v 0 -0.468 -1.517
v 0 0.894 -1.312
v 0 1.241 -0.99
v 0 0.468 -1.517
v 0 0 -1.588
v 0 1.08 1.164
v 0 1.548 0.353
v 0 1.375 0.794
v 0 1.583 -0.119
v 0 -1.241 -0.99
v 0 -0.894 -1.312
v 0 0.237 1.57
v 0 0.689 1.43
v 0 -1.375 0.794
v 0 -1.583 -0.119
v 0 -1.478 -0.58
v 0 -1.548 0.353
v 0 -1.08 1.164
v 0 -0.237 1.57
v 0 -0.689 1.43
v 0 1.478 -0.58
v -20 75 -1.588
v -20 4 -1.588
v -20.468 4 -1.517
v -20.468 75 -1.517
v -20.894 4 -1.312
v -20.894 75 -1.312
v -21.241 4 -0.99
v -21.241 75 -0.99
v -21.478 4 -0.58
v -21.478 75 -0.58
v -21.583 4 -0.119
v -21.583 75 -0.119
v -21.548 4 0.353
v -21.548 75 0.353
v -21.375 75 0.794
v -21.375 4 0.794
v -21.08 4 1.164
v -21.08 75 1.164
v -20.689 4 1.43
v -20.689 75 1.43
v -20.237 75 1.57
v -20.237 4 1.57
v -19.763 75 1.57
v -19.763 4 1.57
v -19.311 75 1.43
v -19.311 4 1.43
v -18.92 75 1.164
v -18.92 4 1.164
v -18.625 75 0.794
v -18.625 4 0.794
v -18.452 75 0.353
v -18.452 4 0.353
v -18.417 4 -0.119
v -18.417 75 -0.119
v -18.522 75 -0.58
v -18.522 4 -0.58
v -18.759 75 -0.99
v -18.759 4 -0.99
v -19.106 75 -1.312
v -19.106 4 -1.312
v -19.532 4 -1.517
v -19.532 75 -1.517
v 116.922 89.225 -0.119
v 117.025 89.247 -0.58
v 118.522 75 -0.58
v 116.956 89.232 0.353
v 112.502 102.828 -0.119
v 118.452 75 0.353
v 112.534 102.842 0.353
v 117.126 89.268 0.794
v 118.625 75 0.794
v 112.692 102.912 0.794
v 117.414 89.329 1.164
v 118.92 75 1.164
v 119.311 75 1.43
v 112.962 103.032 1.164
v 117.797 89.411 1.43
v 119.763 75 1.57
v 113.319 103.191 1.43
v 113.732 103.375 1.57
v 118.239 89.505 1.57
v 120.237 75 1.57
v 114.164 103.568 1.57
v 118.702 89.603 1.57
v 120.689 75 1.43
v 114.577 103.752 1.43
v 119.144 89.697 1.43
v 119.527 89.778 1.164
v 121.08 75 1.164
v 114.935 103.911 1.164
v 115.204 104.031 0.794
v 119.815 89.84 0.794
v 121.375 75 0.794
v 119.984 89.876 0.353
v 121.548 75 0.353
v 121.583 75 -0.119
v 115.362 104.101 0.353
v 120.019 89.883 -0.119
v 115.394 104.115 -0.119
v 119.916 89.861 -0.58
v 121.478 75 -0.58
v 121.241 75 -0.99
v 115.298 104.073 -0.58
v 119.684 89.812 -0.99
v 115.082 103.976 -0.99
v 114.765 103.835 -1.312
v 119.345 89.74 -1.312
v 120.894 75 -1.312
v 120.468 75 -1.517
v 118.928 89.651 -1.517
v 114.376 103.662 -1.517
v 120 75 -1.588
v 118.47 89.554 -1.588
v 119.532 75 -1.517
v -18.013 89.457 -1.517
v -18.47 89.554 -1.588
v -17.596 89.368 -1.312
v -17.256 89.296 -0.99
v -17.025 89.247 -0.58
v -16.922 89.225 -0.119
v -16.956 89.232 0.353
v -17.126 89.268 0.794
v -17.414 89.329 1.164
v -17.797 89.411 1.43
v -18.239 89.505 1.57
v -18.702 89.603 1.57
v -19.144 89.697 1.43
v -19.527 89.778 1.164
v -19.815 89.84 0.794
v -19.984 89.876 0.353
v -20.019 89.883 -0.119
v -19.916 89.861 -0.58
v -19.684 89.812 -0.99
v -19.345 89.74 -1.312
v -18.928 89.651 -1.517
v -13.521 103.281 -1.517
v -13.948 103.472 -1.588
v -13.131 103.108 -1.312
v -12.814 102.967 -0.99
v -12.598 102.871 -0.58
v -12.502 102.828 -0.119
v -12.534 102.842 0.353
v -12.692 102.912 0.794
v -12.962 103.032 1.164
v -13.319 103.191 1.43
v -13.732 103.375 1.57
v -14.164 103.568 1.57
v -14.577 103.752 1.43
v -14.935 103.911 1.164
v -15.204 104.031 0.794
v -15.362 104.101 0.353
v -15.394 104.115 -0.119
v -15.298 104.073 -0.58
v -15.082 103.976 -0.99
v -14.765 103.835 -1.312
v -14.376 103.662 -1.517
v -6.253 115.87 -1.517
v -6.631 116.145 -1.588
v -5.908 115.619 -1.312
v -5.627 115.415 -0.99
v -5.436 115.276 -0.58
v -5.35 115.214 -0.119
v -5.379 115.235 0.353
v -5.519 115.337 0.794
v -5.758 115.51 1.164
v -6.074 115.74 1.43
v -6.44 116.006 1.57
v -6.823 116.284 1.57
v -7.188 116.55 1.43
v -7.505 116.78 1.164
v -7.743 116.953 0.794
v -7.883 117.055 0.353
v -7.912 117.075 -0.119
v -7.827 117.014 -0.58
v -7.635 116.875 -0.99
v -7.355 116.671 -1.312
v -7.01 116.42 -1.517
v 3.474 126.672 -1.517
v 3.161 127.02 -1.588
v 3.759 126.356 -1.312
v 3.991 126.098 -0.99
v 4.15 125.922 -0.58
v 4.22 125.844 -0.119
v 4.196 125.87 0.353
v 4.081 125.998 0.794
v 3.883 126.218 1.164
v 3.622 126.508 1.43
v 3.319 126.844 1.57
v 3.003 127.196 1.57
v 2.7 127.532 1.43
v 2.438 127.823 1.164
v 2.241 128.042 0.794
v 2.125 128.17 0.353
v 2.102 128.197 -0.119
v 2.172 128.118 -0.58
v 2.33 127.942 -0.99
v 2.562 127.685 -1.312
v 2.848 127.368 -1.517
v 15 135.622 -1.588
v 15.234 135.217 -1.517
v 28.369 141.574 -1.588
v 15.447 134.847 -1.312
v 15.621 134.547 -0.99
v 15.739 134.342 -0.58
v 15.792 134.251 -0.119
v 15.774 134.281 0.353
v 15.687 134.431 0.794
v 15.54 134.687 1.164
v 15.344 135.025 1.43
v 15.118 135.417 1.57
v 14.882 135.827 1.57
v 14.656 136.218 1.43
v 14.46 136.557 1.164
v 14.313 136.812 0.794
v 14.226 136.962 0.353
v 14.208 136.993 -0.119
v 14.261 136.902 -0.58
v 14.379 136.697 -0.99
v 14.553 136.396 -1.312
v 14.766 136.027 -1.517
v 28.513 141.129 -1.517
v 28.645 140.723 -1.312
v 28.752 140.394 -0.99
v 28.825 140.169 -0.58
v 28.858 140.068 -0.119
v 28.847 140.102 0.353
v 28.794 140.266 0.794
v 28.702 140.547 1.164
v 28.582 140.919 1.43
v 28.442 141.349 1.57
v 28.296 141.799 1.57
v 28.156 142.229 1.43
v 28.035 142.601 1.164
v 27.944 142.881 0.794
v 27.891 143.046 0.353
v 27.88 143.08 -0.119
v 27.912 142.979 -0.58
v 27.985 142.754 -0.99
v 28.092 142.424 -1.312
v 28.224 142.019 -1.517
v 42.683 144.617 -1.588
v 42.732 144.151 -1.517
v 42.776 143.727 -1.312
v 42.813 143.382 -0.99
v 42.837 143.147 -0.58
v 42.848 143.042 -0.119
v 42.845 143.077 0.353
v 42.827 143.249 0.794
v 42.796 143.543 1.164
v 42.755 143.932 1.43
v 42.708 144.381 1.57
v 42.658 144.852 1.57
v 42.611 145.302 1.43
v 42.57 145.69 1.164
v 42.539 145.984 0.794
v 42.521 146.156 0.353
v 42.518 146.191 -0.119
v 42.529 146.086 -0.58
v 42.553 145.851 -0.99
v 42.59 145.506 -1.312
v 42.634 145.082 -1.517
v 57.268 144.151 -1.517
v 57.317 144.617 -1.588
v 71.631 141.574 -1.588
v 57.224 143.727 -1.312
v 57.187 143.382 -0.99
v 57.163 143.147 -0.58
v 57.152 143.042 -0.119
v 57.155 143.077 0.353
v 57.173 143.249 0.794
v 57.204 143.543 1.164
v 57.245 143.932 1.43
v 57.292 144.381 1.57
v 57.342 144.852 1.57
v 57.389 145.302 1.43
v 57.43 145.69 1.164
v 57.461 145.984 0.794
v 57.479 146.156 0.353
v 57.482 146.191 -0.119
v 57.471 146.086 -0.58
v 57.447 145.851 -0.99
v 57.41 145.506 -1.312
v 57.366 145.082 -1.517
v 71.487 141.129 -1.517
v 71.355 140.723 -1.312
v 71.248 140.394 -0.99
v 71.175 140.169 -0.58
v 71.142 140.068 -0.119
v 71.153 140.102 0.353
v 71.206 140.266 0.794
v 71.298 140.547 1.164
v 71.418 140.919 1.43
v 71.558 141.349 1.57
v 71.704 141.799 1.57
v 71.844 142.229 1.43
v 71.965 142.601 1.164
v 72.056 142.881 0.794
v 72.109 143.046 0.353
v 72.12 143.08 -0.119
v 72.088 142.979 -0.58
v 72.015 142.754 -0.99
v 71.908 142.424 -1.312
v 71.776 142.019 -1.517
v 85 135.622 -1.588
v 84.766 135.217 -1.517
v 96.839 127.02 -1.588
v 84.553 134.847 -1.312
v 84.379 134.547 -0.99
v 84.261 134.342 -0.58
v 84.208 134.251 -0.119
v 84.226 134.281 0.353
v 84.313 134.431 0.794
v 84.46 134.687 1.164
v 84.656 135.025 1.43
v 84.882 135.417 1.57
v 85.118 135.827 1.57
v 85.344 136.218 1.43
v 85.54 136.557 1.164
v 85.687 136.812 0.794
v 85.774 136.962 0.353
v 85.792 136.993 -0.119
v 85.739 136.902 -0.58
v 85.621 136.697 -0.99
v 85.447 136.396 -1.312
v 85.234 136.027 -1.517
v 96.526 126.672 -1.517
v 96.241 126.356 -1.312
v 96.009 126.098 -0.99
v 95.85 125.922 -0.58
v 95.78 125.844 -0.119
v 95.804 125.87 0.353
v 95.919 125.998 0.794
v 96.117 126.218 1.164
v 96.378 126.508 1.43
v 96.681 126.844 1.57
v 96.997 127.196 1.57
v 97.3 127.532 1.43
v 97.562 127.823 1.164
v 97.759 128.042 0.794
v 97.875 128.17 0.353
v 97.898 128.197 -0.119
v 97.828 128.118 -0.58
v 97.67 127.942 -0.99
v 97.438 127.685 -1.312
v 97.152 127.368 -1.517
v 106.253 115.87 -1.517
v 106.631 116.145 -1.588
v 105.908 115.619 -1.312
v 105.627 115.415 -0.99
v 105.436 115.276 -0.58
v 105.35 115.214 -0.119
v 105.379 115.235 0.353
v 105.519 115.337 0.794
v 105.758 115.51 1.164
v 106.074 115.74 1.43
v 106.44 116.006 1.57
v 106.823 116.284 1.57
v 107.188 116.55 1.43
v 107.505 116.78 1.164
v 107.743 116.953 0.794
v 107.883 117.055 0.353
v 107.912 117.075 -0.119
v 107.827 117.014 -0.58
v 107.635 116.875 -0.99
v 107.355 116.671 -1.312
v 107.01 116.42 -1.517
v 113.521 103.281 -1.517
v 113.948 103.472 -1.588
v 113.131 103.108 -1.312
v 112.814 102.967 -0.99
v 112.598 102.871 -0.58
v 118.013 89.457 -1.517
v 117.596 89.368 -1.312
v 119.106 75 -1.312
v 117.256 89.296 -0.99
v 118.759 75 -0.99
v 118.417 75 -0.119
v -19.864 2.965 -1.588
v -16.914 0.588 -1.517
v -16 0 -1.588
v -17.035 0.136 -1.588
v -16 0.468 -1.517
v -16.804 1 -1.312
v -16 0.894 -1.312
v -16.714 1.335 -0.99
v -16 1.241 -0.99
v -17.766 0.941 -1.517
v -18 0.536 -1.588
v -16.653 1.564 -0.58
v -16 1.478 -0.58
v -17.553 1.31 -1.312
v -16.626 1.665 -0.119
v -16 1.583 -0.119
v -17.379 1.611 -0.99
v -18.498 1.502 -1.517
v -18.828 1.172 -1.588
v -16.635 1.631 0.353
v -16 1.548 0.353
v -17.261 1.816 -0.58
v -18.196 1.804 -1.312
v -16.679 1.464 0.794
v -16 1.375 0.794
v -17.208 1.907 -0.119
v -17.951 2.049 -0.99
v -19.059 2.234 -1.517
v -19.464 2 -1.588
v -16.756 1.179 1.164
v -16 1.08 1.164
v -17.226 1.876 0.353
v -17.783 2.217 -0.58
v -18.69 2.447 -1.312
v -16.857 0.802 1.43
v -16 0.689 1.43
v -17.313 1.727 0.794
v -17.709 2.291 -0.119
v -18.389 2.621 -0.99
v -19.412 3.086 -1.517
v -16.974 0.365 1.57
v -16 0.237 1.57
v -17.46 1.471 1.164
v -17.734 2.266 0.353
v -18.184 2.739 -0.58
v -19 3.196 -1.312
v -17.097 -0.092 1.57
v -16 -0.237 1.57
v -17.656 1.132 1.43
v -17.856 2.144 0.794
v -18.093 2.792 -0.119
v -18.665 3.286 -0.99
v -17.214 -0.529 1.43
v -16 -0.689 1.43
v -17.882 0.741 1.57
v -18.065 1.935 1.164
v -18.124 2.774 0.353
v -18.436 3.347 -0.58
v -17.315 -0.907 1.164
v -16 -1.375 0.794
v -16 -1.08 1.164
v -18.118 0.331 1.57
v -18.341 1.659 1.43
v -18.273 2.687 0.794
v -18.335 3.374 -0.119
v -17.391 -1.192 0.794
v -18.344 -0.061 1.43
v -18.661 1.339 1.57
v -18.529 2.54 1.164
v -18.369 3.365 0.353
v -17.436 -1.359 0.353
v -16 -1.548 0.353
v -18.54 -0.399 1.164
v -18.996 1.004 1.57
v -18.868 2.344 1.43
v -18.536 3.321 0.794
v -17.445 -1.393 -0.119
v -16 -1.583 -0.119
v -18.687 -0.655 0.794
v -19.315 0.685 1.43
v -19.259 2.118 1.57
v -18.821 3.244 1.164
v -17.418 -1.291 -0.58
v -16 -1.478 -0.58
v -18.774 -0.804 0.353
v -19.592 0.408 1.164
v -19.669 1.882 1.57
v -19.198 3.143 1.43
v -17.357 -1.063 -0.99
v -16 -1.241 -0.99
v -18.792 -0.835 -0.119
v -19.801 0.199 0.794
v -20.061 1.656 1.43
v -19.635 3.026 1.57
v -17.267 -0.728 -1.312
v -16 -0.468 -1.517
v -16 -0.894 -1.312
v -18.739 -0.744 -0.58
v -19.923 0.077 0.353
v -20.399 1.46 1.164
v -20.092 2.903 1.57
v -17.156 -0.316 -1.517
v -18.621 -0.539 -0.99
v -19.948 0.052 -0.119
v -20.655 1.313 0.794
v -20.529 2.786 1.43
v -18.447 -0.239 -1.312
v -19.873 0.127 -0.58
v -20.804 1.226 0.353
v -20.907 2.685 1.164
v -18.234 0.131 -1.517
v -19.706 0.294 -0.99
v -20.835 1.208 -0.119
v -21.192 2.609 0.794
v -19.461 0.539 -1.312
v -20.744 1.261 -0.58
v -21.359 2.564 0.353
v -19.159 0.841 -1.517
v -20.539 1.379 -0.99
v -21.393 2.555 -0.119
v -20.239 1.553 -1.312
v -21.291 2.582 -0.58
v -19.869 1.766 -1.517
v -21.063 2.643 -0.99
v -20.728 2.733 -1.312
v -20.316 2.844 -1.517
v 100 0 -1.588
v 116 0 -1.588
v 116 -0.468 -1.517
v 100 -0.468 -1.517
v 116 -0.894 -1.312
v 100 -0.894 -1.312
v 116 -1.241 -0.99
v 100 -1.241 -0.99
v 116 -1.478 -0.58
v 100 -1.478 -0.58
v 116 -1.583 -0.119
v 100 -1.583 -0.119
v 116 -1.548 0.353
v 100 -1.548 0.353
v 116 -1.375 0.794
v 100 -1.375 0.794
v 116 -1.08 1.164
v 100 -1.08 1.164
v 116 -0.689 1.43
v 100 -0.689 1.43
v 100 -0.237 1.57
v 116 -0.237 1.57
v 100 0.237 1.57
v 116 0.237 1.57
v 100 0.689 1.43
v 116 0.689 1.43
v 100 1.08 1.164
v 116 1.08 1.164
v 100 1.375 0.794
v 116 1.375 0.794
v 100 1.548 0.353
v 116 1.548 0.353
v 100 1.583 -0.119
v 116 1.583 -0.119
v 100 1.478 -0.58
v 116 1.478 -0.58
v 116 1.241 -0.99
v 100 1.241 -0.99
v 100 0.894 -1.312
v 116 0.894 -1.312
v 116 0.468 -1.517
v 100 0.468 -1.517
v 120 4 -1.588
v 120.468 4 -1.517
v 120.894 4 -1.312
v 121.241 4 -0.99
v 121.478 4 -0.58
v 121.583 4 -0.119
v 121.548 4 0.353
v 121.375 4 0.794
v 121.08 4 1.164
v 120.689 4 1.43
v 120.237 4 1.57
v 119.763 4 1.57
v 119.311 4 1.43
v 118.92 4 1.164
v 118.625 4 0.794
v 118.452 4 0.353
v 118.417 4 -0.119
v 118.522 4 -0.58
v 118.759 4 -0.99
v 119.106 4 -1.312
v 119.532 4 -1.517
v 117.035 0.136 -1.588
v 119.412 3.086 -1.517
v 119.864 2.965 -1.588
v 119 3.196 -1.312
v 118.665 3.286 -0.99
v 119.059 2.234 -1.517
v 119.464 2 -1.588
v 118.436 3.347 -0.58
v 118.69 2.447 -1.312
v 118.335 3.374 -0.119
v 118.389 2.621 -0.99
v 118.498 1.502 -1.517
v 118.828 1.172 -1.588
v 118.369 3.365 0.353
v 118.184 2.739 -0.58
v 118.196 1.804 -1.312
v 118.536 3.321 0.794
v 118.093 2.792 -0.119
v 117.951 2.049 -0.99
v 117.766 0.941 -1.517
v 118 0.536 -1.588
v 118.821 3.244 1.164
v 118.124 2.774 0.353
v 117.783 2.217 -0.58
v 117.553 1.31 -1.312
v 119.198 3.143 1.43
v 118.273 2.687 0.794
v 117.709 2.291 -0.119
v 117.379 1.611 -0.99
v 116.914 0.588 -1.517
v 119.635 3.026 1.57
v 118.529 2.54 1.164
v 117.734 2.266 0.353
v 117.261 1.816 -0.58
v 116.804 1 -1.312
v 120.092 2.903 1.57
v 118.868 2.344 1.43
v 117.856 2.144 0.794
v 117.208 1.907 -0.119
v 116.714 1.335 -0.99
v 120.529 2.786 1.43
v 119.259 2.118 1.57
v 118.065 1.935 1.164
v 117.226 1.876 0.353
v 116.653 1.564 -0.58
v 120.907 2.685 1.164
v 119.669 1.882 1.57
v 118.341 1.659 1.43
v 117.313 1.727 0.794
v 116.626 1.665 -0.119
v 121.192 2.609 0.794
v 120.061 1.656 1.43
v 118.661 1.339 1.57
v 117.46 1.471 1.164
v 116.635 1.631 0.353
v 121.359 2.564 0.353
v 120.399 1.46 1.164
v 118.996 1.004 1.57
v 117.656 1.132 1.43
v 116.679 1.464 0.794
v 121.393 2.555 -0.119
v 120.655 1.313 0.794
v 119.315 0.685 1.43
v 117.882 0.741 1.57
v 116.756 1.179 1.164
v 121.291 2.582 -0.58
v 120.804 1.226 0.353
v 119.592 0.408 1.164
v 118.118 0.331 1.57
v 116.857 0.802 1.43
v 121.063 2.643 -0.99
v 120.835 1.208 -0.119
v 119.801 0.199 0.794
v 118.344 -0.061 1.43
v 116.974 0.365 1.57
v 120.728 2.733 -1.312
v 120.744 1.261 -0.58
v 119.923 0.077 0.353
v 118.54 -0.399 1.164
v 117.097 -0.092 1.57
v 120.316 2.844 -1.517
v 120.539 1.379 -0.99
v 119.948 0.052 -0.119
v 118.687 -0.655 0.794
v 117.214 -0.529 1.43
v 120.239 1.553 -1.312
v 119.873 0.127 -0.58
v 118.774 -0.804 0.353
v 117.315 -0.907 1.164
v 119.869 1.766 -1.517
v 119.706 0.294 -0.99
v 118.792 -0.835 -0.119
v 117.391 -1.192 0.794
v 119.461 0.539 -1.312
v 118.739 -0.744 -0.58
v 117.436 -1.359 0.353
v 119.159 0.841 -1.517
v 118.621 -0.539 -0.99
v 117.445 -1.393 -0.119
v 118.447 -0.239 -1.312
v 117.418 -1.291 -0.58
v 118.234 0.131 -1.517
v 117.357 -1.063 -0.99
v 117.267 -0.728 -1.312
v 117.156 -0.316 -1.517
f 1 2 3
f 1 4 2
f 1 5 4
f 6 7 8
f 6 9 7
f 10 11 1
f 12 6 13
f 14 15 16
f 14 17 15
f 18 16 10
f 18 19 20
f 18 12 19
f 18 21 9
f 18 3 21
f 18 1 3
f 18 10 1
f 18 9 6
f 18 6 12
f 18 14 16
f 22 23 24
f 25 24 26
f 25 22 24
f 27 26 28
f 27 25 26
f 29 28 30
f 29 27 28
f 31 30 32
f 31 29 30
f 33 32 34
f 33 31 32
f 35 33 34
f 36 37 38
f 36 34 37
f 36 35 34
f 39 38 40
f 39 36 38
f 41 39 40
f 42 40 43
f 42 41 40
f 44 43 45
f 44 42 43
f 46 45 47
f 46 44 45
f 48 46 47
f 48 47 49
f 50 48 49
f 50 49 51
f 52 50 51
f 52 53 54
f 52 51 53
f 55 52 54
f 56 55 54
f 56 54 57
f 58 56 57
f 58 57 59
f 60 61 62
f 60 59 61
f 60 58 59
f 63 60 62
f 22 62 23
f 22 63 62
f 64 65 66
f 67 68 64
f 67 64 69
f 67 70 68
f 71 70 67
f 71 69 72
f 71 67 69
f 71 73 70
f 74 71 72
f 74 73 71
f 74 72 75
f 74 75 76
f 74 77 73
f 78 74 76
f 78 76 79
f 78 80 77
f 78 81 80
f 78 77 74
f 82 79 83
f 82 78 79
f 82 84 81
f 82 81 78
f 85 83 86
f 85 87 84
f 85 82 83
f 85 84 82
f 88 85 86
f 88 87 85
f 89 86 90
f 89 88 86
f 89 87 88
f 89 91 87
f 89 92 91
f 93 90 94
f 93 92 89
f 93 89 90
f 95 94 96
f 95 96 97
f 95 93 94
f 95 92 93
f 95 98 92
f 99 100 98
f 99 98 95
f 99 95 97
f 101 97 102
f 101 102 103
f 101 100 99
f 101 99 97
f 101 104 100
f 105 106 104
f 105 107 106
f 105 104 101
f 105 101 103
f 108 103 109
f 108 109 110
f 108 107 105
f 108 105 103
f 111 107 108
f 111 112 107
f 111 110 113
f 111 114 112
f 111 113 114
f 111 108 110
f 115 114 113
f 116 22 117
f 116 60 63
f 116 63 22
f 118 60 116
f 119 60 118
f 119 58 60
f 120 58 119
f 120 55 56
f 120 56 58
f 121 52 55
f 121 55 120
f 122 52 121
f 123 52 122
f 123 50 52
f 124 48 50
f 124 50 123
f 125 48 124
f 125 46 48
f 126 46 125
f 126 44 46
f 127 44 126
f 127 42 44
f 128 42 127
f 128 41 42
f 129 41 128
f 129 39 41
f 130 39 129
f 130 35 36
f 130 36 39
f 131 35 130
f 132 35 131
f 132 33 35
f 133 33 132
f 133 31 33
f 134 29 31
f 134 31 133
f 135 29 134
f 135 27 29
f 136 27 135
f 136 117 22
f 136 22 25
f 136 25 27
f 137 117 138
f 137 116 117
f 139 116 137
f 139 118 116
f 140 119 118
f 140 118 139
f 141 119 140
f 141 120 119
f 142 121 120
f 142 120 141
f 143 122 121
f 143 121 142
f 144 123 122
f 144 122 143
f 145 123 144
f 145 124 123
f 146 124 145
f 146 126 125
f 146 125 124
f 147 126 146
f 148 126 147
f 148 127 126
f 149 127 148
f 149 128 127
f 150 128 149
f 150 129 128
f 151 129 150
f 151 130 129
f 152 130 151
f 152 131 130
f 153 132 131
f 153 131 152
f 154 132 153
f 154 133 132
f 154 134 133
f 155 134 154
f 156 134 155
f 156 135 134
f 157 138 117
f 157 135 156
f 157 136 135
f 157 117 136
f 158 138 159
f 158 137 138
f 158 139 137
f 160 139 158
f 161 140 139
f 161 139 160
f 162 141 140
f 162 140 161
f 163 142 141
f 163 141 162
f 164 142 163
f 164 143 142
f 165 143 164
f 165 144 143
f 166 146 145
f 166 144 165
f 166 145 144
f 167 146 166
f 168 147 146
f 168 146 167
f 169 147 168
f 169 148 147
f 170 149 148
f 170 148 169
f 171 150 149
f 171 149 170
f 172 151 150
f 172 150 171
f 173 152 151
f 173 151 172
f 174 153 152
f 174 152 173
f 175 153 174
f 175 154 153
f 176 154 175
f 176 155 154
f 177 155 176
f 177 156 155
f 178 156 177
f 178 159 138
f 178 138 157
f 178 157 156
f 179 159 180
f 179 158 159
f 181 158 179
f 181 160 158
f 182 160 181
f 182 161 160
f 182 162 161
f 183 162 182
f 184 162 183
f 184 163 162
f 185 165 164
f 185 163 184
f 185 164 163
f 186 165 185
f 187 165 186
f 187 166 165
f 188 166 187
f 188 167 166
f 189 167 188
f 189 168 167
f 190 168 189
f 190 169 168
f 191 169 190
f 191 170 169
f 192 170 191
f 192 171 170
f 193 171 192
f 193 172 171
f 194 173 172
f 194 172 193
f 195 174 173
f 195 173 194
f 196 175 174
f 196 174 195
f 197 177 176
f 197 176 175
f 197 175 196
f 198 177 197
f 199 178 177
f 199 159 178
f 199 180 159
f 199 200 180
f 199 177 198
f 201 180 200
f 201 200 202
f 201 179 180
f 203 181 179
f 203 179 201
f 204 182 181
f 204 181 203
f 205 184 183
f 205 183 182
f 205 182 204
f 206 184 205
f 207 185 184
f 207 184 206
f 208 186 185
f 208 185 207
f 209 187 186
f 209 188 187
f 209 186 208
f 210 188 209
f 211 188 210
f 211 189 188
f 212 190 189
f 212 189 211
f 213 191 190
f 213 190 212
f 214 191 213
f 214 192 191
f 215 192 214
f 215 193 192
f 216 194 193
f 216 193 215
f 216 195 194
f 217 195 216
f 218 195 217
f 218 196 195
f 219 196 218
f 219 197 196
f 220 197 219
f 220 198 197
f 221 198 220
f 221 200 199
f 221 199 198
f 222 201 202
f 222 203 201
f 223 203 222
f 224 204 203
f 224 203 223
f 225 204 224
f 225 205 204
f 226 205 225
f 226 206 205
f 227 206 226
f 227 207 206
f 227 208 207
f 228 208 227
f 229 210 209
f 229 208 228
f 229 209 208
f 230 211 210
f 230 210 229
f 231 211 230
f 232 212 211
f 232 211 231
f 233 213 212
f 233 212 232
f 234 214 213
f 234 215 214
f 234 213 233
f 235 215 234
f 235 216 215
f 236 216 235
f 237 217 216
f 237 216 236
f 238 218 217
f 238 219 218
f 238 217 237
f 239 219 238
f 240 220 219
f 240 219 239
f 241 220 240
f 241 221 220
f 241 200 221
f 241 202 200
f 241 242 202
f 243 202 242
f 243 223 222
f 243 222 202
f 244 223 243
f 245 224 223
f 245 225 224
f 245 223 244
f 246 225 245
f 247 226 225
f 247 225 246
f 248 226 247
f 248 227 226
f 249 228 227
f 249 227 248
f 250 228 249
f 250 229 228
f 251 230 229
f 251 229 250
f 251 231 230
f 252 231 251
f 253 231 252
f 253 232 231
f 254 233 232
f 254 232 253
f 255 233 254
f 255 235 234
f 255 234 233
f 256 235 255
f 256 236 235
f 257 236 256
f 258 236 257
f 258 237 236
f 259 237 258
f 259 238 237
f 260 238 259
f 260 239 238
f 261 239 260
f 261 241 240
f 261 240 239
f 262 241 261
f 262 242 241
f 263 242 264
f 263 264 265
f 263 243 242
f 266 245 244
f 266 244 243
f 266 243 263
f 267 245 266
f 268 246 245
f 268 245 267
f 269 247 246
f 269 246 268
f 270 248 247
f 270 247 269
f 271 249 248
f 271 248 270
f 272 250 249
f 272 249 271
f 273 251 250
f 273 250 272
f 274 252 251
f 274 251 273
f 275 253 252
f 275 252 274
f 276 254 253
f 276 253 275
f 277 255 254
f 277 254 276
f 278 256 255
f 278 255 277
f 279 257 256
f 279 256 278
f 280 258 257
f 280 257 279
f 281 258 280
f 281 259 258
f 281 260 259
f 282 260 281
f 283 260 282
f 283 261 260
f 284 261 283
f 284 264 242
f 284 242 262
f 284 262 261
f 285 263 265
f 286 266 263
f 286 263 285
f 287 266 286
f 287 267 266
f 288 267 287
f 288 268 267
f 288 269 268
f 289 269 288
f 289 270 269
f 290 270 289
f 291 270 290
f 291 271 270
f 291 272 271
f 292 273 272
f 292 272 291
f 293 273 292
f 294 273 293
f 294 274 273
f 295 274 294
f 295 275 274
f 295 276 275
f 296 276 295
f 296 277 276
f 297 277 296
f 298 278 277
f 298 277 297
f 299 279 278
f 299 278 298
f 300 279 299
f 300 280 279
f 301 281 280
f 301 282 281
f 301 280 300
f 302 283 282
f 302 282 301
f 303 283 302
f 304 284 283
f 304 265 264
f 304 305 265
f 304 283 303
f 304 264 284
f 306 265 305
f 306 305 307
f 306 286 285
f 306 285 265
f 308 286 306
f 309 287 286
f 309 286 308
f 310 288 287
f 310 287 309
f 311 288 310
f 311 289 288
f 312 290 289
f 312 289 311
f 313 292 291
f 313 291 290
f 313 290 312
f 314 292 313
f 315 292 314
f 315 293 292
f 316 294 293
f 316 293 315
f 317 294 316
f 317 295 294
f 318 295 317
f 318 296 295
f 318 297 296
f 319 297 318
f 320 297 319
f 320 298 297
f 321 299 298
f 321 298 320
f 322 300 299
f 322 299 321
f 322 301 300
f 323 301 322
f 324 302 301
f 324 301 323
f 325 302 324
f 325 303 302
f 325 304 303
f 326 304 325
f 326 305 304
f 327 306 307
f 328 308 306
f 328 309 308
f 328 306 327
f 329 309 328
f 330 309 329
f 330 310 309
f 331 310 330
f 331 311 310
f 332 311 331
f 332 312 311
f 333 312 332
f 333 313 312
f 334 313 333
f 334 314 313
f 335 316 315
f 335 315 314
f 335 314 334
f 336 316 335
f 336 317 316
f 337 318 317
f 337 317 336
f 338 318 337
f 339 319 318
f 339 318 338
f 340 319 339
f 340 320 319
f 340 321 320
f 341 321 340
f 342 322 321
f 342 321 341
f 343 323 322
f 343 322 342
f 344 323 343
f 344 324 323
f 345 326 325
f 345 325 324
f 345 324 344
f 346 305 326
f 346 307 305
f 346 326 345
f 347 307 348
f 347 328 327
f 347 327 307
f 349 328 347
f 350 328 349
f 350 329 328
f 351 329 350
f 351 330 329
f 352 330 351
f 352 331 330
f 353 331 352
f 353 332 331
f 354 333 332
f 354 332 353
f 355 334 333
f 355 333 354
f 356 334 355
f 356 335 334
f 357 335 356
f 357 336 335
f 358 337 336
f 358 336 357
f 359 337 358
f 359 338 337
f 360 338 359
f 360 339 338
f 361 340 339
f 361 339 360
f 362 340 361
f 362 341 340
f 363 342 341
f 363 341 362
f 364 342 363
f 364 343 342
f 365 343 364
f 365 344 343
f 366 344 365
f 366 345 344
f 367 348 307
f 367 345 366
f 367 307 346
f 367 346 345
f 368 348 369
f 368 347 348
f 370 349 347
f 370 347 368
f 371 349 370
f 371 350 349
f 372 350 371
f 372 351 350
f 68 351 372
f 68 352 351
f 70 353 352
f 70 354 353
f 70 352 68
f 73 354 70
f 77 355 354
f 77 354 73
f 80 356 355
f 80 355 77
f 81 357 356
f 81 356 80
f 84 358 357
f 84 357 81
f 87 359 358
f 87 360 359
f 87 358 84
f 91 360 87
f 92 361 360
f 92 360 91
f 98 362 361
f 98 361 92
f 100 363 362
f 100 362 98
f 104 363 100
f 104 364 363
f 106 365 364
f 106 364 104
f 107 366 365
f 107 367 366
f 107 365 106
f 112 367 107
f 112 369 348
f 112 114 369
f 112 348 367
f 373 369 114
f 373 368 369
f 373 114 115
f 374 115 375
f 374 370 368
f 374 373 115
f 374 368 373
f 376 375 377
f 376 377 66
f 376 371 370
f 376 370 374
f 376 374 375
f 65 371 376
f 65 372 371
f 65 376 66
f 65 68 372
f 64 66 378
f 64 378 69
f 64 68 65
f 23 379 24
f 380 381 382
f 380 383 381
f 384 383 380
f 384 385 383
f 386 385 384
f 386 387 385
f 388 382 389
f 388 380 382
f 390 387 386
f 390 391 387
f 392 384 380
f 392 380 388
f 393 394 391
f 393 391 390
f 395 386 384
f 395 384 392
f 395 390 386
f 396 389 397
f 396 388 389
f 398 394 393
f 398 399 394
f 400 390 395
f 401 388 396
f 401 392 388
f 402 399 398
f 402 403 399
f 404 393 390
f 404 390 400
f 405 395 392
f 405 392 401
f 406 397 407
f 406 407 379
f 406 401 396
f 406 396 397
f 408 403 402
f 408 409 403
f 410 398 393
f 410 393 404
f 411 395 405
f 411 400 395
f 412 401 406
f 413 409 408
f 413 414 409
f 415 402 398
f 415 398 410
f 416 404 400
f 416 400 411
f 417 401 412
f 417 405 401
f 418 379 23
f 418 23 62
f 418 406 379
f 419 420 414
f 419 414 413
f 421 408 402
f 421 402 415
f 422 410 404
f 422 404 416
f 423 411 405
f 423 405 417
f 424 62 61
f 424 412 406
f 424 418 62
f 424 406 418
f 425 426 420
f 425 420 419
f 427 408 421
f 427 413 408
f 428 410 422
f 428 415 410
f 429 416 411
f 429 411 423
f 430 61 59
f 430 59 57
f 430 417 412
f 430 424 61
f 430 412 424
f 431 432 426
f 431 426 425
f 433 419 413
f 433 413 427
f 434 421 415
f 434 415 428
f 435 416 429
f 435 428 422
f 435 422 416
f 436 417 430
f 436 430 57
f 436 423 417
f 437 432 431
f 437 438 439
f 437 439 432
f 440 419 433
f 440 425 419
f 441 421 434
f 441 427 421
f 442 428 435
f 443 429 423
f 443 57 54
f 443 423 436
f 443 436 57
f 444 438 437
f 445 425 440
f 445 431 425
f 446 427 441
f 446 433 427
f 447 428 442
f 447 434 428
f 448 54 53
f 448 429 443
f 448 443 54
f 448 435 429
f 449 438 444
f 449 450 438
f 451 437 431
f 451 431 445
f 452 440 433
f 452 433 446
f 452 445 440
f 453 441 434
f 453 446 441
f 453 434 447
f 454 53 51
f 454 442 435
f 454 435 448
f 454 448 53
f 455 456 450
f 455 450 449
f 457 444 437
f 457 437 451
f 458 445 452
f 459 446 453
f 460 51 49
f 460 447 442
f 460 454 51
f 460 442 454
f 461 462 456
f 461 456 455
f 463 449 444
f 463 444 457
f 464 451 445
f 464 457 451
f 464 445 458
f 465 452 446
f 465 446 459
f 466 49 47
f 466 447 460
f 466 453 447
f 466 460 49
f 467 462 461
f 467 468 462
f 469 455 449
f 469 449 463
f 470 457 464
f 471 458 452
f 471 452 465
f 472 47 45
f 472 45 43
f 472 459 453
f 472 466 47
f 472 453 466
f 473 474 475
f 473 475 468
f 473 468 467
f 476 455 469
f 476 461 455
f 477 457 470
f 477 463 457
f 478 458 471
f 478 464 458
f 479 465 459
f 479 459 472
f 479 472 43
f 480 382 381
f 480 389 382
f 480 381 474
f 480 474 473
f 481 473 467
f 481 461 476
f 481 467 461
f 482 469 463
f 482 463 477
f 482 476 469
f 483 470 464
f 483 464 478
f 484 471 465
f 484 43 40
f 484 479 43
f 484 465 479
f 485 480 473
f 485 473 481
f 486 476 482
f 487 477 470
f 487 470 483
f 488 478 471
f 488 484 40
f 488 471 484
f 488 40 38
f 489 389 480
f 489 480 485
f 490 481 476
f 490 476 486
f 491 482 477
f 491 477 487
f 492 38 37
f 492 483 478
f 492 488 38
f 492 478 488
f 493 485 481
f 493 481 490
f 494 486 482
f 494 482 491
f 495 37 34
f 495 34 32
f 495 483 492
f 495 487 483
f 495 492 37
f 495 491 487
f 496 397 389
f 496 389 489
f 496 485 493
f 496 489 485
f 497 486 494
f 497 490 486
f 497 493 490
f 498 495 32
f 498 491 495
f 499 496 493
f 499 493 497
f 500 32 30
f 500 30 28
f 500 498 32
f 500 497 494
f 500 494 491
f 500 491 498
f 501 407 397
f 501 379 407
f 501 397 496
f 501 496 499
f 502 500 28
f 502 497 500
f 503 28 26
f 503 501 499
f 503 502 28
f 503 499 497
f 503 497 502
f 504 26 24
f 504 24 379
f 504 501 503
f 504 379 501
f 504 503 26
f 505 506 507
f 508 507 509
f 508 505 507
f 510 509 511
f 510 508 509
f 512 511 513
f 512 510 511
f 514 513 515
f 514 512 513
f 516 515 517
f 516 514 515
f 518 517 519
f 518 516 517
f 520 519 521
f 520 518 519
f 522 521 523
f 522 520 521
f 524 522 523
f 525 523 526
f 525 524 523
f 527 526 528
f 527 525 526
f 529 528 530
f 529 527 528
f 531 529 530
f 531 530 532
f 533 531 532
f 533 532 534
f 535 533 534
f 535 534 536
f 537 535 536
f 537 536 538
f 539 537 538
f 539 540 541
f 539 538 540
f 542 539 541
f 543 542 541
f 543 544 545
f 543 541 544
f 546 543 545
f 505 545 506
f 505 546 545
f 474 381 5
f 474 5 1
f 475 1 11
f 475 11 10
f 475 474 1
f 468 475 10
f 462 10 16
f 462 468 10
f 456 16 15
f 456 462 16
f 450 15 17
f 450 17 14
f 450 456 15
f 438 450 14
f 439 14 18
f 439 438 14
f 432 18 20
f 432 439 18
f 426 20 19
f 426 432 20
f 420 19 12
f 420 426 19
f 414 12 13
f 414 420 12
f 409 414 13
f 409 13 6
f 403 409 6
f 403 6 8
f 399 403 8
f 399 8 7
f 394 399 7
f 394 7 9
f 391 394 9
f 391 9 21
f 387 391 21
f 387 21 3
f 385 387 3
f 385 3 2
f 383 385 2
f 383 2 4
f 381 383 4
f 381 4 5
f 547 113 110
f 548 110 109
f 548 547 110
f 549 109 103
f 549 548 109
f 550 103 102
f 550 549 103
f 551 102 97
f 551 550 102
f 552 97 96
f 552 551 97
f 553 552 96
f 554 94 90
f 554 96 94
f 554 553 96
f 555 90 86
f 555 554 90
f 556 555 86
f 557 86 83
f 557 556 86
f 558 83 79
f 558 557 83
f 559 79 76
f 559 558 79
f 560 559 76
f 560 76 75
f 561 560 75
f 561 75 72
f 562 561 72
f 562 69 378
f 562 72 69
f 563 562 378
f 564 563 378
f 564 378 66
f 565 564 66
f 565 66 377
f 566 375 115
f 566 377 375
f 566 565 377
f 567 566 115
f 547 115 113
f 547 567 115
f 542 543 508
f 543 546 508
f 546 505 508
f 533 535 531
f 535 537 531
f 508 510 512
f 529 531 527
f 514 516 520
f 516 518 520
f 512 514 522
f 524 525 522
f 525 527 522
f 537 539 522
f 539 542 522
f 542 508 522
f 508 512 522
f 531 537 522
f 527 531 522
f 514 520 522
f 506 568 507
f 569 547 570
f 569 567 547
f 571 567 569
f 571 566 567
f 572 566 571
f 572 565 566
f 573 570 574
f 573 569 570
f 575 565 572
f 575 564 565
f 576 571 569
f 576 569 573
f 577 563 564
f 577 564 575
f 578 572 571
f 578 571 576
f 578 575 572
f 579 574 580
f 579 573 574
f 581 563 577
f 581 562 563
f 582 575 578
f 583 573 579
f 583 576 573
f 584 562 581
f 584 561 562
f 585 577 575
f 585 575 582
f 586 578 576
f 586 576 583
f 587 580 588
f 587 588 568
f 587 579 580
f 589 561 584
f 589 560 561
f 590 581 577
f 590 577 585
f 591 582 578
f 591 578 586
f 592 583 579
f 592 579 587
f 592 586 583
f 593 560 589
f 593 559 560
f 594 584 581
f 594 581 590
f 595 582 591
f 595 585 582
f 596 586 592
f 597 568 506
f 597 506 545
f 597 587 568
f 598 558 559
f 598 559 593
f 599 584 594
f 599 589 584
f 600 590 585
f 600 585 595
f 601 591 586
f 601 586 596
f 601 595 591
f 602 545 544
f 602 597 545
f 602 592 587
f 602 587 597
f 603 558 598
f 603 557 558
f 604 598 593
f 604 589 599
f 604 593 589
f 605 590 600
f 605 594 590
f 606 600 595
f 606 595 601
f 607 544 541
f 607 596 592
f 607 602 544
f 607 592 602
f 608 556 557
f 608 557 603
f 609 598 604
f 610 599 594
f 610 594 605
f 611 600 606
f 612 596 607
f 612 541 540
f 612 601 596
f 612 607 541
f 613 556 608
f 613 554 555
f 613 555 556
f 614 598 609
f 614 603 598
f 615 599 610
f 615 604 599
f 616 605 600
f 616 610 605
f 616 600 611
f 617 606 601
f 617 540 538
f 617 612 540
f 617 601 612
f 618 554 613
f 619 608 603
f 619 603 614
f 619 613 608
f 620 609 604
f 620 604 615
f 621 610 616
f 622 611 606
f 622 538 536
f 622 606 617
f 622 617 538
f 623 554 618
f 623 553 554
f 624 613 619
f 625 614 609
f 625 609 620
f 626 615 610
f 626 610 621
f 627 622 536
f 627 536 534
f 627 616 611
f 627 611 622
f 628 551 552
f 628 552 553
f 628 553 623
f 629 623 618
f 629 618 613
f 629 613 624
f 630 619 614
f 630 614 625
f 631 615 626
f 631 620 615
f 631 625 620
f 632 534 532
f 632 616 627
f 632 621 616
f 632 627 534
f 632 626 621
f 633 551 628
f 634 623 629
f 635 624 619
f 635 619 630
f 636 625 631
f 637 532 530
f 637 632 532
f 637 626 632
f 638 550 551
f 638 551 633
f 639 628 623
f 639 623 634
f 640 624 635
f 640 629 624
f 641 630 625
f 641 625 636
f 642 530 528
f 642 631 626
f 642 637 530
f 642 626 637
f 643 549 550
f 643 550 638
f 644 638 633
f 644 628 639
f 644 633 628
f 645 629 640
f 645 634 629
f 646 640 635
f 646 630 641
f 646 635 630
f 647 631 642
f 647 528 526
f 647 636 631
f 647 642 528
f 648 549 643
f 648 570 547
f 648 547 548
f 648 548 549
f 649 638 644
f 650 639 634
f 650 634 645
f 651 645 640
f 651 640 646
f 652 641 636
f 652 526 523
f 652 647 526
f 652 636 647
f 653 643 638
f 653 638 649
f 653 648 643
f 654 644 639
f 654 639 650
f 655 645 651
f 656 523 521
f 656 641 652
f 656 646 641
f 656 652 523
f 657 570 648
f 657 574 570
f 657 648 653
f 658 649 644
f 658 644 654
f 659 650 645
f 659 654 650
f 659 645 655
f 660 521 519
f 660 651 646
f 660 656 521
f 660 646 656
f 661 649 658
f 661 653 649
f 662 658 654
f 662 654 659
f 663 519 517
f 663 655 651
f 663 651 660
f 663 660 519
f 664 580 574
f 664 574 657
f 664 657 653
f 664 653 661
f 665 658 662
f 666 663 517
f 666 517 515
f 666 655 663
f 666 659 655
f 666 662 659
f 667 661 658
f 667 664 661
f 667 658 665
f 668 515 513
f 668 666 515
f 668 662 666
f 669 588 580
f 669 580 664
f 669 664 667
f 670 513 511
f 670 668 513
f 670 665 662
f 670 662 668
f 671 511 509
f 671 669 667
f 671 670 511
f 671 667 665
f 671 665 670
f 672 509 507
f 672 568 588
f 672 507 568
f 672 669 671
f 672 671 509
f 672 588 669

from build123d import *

# Parameters (mm, degrees)
SKETCH2_R = 1.5875


with BuildPart() as part:
    # Sweep1: sweep along a path in Sketch1
    with BuildLine(Plane.XY) as sweep1_path:
        Line((0, 0), (-16, 0))
        ThreePointArc((-16, 0), (-18.828427125, 1.171572875), (-20, 4))
        Line((-20, 4), (-20, 75))
        ThreePointArc((-20, 75), (50, 145), (120, 75))
        Line((120, 75), (120, 4))
        ThreePointArc((120, 4), (118.828427125, 1.171572875), (116, 0))
        Line((116, 0), (100, 0))
    # Sketch2 → Sweep1 (sweep)
    with BuildSketch(Plane(origin=(0, 0, 0), x_dir=(0, 0, -1), z_dir=(1, 0, 0))):
        Circle(SKETCH2_R)
    sweep(path=sweep1_path.line)


solid = part.part
